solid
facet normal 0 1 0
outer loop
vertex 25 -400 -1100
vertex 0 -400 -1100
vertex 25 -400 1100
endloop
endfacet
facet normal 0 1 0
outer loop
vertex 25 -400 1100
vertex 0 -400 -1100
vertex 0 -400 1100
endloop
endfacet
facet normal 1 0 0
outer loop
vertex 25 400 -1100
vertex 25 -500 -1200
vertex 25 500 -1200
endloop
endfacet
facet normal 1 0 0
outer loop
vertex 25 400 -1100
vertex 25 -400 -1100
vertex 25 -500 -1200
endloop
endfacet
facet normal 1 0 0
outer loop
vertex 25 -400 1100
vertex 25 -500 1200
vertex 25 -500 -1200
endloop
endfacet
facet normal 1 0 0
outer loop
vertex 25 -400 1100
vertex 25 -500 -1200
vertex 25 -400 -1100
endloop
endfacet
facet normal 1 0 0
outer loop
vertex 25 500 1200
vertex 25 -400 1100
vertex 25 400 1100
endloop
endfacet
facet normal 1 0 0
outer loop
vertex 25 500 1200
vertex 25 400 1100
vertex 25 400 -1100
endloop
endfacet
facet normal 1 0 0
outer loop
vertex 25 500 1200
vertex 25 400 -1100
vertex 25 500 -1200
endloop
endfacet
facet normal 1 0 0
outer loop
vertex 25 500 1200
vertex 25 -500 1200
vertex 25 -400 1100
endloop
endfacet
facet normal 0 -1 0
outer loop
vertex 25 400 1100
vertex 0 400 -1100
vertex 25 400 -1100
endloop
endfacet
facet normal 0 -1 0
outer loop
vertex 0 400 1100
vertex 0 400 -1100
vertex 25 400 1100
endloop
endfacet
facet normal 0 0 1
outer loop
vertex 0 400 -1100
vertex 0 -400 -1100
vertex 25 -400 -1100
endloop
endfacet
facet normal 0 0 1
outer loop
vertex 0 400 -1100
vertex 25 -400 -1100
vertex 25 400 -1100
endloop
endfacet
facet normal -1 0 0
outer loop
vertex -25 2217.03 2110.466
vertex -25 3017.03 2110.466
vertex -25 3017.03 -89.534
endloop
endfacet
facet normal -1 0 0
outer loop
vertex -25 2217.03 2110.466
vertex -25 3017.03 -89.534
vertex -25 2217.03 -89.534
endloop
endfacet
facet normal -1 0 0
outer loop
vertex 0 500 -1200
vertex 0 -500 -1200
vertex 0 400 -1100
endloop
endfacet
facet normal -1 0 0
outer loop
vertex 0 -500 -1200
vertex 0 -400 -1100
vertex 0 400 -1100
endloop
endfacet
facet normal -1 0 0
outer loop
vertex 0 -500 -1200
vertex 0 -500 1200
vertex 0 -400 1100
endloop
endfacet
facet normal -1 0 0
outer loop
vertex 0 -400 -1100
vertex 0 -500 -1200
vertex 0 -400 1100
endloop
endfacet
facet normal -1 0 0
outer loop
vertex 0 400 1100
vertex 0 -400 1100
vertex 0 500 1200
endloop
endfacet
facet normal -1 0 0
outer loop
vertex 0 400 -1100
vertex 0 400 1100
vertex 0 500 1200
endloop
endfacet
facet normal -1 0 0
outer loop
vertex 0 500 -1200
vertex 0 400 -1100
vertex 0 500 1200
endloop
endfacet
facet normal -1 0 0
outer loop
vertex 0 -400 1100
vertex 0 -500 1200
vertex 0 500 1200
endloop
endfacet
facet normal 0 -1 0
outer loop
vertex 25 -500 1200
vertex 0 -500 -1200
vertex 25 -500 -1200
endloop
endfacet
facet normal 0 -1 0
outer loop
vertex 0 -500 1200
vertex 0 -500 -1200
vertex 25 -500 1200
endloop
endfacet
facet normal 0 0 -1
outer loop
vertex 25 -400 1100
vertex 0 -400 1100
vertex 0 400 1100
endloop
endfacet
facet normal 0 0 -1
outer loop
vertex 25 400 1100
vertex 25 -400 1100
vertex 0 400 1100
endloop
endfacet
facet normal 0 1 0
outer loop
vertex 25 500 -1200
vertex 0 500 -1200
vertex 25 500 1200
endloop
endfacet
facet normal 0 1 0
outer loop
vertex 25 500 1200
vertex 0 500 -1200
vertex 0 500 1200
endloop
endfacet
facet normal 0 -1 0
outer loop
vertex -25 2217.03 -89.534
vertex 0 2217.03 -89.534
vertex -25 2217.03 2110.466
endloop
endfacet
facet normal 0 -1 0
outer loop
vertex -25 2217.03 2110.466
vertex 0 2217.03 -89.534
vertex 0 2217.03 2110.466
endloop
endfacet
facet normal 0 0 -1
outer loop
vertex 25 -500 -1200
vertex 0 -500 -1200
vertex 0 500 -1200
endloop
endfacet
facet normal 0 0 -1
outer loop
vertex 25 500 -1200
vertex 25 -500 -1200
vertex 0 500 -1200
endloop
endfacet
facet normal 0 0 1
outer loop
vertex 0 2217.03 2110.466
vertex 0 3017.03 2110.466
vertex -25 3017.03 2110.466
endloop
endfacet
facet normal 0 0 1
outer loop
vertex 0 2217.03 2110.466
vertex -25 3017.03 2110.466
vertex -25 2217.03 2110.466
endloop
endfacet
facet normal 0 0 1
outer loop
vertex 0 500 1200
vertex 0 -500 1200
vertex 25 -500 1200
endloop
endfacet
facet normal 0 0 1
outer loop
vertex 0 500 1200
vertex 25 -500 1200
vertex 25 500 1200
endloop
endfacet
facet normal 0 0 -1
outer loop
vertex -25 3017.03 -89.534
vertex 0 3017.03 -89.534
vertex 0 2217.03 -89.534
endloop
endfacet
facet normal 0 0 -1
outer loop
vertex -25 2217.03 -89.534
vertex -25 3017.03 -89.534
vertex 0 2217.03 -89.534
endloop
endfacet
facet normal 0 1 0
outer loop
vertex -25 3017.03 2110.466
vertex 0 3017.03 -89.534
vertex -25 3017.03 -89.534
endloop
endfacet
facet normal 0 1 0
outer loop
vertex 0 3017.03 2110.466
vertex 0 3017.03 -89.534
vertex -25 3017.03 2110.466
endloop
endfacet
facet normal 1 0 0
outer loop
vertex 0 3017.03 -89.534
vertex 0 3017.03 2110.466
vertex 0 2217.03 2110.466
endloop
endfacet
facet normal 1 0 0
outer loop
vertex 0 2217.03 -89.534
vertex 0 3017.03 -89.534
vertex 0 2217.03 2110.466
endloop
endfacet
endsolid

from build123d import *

# Parameters (mm, degrees)
F0_W     = 1000
F0_H     = 2400
F0_W_2   = 800
F0_H_2   = 2200
F1_DEPTH = 25
F2_W     = 800
F2_H     = 2200
F3_DEPTH = 25


with BuildPart() as f1:
    # F0 (on Right) → F1 (new body)
    with BuildSketch(Plane.YZ):
        Rectangle(F0_W, F0_H)
        Rectangle(F0_W_2, F0_H_2, mode=Mode.SUBTRACT)
    extrude(amount=F1_DEPTH)


with BuildPart() as f3:
    # F2 (on face) → F3 (new body)
    with BuildSketch(Plane(origin=(0, 0, 0), x_dir=(0, -1, 0), z_dir=(-1, 0, 0))):
        with Locations((-2617.029762, 1010.46647)):
            Rectangle(F2_W, F2_H)
    extrude(amount=F3_DEPTH)


solid = Compound([f1.part, f3.part])
